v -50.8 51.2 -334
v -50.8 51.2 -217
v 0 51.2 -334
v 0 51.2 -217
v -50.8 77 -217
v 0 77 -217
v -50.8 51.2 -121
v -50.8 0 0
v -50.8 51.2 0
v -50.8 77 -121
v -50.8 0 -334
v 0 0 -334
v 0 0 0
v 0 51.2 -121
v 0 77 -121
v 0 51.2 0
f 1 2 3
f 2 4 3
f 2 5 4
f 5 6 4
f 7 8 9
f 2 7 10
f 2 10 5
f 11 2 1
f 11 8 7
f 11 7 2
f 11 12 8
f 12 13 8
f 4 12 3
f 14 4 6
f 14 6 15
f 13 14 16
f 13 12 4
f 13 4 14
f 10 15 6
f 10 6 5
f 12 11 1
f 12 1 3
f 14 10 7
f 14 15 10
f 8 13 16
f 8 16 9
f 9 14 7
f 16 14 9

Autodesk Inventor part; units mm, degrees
ref_plane "YZ Plane" through (0, 0, 0) normal (1, 0, 0) x (0, 1, 0)
ref_plane "XZ Plane" through (0, 0, 0) normal (0, 1, 0) x (-1, 0, 0)
ref_plane "XY Plane" through (0, 0, 0) normal (0, 0, 1) x (1, 0, 0)
sketch "Sketch1" plane through (0, 0, 0) normal (0, 1, 0) x (-1, 0, 0)
  line L0 (0, 0) -> (50.8, 0)
  line L1 (50.8, 0) -> (50.8, -334)
  line L2 (50.8, -334) -> (0, -334)
  line L3 (0, -334) -> (0, 0)
  dimension "d0" = 50.8
  dimension "d1" = 334
extrude "Extrusion1" add sketch "Sketch1" along normal blind 77
sketch "Sketch3" plane through (0, 0, 0) normal (1, 0, 0) x (0, 0, -1)
  line L0 (0, 77) -> (121, 77)
  line L1 (121, 77) -> (121, 51.2)
  line L2 (121, 51.2) -> (0, 51.2)
  line L3 (0, 51.2) -> (0, 77)
  line L4 (0, 77) -> (334, 77) projected
  line L5 (334, 77) -> (217, 77)
  line L6 (217, 77) -> (217, 51.2)
  line L7 (217, 51.2) -> (334, 51.2)
  line L8 (334, 51.2) -> (334, 77)
  point P0 (0, 0)
  dimension "d9" = 25.8
  dimension "d10" = 117
  dimension "d11" = 25.8
  dimension "d14" = 96
extrude "Extrusion2" cut sketch "Sketch3" against normal blind 52.8
properties part number "PiezaPuerta-1"
